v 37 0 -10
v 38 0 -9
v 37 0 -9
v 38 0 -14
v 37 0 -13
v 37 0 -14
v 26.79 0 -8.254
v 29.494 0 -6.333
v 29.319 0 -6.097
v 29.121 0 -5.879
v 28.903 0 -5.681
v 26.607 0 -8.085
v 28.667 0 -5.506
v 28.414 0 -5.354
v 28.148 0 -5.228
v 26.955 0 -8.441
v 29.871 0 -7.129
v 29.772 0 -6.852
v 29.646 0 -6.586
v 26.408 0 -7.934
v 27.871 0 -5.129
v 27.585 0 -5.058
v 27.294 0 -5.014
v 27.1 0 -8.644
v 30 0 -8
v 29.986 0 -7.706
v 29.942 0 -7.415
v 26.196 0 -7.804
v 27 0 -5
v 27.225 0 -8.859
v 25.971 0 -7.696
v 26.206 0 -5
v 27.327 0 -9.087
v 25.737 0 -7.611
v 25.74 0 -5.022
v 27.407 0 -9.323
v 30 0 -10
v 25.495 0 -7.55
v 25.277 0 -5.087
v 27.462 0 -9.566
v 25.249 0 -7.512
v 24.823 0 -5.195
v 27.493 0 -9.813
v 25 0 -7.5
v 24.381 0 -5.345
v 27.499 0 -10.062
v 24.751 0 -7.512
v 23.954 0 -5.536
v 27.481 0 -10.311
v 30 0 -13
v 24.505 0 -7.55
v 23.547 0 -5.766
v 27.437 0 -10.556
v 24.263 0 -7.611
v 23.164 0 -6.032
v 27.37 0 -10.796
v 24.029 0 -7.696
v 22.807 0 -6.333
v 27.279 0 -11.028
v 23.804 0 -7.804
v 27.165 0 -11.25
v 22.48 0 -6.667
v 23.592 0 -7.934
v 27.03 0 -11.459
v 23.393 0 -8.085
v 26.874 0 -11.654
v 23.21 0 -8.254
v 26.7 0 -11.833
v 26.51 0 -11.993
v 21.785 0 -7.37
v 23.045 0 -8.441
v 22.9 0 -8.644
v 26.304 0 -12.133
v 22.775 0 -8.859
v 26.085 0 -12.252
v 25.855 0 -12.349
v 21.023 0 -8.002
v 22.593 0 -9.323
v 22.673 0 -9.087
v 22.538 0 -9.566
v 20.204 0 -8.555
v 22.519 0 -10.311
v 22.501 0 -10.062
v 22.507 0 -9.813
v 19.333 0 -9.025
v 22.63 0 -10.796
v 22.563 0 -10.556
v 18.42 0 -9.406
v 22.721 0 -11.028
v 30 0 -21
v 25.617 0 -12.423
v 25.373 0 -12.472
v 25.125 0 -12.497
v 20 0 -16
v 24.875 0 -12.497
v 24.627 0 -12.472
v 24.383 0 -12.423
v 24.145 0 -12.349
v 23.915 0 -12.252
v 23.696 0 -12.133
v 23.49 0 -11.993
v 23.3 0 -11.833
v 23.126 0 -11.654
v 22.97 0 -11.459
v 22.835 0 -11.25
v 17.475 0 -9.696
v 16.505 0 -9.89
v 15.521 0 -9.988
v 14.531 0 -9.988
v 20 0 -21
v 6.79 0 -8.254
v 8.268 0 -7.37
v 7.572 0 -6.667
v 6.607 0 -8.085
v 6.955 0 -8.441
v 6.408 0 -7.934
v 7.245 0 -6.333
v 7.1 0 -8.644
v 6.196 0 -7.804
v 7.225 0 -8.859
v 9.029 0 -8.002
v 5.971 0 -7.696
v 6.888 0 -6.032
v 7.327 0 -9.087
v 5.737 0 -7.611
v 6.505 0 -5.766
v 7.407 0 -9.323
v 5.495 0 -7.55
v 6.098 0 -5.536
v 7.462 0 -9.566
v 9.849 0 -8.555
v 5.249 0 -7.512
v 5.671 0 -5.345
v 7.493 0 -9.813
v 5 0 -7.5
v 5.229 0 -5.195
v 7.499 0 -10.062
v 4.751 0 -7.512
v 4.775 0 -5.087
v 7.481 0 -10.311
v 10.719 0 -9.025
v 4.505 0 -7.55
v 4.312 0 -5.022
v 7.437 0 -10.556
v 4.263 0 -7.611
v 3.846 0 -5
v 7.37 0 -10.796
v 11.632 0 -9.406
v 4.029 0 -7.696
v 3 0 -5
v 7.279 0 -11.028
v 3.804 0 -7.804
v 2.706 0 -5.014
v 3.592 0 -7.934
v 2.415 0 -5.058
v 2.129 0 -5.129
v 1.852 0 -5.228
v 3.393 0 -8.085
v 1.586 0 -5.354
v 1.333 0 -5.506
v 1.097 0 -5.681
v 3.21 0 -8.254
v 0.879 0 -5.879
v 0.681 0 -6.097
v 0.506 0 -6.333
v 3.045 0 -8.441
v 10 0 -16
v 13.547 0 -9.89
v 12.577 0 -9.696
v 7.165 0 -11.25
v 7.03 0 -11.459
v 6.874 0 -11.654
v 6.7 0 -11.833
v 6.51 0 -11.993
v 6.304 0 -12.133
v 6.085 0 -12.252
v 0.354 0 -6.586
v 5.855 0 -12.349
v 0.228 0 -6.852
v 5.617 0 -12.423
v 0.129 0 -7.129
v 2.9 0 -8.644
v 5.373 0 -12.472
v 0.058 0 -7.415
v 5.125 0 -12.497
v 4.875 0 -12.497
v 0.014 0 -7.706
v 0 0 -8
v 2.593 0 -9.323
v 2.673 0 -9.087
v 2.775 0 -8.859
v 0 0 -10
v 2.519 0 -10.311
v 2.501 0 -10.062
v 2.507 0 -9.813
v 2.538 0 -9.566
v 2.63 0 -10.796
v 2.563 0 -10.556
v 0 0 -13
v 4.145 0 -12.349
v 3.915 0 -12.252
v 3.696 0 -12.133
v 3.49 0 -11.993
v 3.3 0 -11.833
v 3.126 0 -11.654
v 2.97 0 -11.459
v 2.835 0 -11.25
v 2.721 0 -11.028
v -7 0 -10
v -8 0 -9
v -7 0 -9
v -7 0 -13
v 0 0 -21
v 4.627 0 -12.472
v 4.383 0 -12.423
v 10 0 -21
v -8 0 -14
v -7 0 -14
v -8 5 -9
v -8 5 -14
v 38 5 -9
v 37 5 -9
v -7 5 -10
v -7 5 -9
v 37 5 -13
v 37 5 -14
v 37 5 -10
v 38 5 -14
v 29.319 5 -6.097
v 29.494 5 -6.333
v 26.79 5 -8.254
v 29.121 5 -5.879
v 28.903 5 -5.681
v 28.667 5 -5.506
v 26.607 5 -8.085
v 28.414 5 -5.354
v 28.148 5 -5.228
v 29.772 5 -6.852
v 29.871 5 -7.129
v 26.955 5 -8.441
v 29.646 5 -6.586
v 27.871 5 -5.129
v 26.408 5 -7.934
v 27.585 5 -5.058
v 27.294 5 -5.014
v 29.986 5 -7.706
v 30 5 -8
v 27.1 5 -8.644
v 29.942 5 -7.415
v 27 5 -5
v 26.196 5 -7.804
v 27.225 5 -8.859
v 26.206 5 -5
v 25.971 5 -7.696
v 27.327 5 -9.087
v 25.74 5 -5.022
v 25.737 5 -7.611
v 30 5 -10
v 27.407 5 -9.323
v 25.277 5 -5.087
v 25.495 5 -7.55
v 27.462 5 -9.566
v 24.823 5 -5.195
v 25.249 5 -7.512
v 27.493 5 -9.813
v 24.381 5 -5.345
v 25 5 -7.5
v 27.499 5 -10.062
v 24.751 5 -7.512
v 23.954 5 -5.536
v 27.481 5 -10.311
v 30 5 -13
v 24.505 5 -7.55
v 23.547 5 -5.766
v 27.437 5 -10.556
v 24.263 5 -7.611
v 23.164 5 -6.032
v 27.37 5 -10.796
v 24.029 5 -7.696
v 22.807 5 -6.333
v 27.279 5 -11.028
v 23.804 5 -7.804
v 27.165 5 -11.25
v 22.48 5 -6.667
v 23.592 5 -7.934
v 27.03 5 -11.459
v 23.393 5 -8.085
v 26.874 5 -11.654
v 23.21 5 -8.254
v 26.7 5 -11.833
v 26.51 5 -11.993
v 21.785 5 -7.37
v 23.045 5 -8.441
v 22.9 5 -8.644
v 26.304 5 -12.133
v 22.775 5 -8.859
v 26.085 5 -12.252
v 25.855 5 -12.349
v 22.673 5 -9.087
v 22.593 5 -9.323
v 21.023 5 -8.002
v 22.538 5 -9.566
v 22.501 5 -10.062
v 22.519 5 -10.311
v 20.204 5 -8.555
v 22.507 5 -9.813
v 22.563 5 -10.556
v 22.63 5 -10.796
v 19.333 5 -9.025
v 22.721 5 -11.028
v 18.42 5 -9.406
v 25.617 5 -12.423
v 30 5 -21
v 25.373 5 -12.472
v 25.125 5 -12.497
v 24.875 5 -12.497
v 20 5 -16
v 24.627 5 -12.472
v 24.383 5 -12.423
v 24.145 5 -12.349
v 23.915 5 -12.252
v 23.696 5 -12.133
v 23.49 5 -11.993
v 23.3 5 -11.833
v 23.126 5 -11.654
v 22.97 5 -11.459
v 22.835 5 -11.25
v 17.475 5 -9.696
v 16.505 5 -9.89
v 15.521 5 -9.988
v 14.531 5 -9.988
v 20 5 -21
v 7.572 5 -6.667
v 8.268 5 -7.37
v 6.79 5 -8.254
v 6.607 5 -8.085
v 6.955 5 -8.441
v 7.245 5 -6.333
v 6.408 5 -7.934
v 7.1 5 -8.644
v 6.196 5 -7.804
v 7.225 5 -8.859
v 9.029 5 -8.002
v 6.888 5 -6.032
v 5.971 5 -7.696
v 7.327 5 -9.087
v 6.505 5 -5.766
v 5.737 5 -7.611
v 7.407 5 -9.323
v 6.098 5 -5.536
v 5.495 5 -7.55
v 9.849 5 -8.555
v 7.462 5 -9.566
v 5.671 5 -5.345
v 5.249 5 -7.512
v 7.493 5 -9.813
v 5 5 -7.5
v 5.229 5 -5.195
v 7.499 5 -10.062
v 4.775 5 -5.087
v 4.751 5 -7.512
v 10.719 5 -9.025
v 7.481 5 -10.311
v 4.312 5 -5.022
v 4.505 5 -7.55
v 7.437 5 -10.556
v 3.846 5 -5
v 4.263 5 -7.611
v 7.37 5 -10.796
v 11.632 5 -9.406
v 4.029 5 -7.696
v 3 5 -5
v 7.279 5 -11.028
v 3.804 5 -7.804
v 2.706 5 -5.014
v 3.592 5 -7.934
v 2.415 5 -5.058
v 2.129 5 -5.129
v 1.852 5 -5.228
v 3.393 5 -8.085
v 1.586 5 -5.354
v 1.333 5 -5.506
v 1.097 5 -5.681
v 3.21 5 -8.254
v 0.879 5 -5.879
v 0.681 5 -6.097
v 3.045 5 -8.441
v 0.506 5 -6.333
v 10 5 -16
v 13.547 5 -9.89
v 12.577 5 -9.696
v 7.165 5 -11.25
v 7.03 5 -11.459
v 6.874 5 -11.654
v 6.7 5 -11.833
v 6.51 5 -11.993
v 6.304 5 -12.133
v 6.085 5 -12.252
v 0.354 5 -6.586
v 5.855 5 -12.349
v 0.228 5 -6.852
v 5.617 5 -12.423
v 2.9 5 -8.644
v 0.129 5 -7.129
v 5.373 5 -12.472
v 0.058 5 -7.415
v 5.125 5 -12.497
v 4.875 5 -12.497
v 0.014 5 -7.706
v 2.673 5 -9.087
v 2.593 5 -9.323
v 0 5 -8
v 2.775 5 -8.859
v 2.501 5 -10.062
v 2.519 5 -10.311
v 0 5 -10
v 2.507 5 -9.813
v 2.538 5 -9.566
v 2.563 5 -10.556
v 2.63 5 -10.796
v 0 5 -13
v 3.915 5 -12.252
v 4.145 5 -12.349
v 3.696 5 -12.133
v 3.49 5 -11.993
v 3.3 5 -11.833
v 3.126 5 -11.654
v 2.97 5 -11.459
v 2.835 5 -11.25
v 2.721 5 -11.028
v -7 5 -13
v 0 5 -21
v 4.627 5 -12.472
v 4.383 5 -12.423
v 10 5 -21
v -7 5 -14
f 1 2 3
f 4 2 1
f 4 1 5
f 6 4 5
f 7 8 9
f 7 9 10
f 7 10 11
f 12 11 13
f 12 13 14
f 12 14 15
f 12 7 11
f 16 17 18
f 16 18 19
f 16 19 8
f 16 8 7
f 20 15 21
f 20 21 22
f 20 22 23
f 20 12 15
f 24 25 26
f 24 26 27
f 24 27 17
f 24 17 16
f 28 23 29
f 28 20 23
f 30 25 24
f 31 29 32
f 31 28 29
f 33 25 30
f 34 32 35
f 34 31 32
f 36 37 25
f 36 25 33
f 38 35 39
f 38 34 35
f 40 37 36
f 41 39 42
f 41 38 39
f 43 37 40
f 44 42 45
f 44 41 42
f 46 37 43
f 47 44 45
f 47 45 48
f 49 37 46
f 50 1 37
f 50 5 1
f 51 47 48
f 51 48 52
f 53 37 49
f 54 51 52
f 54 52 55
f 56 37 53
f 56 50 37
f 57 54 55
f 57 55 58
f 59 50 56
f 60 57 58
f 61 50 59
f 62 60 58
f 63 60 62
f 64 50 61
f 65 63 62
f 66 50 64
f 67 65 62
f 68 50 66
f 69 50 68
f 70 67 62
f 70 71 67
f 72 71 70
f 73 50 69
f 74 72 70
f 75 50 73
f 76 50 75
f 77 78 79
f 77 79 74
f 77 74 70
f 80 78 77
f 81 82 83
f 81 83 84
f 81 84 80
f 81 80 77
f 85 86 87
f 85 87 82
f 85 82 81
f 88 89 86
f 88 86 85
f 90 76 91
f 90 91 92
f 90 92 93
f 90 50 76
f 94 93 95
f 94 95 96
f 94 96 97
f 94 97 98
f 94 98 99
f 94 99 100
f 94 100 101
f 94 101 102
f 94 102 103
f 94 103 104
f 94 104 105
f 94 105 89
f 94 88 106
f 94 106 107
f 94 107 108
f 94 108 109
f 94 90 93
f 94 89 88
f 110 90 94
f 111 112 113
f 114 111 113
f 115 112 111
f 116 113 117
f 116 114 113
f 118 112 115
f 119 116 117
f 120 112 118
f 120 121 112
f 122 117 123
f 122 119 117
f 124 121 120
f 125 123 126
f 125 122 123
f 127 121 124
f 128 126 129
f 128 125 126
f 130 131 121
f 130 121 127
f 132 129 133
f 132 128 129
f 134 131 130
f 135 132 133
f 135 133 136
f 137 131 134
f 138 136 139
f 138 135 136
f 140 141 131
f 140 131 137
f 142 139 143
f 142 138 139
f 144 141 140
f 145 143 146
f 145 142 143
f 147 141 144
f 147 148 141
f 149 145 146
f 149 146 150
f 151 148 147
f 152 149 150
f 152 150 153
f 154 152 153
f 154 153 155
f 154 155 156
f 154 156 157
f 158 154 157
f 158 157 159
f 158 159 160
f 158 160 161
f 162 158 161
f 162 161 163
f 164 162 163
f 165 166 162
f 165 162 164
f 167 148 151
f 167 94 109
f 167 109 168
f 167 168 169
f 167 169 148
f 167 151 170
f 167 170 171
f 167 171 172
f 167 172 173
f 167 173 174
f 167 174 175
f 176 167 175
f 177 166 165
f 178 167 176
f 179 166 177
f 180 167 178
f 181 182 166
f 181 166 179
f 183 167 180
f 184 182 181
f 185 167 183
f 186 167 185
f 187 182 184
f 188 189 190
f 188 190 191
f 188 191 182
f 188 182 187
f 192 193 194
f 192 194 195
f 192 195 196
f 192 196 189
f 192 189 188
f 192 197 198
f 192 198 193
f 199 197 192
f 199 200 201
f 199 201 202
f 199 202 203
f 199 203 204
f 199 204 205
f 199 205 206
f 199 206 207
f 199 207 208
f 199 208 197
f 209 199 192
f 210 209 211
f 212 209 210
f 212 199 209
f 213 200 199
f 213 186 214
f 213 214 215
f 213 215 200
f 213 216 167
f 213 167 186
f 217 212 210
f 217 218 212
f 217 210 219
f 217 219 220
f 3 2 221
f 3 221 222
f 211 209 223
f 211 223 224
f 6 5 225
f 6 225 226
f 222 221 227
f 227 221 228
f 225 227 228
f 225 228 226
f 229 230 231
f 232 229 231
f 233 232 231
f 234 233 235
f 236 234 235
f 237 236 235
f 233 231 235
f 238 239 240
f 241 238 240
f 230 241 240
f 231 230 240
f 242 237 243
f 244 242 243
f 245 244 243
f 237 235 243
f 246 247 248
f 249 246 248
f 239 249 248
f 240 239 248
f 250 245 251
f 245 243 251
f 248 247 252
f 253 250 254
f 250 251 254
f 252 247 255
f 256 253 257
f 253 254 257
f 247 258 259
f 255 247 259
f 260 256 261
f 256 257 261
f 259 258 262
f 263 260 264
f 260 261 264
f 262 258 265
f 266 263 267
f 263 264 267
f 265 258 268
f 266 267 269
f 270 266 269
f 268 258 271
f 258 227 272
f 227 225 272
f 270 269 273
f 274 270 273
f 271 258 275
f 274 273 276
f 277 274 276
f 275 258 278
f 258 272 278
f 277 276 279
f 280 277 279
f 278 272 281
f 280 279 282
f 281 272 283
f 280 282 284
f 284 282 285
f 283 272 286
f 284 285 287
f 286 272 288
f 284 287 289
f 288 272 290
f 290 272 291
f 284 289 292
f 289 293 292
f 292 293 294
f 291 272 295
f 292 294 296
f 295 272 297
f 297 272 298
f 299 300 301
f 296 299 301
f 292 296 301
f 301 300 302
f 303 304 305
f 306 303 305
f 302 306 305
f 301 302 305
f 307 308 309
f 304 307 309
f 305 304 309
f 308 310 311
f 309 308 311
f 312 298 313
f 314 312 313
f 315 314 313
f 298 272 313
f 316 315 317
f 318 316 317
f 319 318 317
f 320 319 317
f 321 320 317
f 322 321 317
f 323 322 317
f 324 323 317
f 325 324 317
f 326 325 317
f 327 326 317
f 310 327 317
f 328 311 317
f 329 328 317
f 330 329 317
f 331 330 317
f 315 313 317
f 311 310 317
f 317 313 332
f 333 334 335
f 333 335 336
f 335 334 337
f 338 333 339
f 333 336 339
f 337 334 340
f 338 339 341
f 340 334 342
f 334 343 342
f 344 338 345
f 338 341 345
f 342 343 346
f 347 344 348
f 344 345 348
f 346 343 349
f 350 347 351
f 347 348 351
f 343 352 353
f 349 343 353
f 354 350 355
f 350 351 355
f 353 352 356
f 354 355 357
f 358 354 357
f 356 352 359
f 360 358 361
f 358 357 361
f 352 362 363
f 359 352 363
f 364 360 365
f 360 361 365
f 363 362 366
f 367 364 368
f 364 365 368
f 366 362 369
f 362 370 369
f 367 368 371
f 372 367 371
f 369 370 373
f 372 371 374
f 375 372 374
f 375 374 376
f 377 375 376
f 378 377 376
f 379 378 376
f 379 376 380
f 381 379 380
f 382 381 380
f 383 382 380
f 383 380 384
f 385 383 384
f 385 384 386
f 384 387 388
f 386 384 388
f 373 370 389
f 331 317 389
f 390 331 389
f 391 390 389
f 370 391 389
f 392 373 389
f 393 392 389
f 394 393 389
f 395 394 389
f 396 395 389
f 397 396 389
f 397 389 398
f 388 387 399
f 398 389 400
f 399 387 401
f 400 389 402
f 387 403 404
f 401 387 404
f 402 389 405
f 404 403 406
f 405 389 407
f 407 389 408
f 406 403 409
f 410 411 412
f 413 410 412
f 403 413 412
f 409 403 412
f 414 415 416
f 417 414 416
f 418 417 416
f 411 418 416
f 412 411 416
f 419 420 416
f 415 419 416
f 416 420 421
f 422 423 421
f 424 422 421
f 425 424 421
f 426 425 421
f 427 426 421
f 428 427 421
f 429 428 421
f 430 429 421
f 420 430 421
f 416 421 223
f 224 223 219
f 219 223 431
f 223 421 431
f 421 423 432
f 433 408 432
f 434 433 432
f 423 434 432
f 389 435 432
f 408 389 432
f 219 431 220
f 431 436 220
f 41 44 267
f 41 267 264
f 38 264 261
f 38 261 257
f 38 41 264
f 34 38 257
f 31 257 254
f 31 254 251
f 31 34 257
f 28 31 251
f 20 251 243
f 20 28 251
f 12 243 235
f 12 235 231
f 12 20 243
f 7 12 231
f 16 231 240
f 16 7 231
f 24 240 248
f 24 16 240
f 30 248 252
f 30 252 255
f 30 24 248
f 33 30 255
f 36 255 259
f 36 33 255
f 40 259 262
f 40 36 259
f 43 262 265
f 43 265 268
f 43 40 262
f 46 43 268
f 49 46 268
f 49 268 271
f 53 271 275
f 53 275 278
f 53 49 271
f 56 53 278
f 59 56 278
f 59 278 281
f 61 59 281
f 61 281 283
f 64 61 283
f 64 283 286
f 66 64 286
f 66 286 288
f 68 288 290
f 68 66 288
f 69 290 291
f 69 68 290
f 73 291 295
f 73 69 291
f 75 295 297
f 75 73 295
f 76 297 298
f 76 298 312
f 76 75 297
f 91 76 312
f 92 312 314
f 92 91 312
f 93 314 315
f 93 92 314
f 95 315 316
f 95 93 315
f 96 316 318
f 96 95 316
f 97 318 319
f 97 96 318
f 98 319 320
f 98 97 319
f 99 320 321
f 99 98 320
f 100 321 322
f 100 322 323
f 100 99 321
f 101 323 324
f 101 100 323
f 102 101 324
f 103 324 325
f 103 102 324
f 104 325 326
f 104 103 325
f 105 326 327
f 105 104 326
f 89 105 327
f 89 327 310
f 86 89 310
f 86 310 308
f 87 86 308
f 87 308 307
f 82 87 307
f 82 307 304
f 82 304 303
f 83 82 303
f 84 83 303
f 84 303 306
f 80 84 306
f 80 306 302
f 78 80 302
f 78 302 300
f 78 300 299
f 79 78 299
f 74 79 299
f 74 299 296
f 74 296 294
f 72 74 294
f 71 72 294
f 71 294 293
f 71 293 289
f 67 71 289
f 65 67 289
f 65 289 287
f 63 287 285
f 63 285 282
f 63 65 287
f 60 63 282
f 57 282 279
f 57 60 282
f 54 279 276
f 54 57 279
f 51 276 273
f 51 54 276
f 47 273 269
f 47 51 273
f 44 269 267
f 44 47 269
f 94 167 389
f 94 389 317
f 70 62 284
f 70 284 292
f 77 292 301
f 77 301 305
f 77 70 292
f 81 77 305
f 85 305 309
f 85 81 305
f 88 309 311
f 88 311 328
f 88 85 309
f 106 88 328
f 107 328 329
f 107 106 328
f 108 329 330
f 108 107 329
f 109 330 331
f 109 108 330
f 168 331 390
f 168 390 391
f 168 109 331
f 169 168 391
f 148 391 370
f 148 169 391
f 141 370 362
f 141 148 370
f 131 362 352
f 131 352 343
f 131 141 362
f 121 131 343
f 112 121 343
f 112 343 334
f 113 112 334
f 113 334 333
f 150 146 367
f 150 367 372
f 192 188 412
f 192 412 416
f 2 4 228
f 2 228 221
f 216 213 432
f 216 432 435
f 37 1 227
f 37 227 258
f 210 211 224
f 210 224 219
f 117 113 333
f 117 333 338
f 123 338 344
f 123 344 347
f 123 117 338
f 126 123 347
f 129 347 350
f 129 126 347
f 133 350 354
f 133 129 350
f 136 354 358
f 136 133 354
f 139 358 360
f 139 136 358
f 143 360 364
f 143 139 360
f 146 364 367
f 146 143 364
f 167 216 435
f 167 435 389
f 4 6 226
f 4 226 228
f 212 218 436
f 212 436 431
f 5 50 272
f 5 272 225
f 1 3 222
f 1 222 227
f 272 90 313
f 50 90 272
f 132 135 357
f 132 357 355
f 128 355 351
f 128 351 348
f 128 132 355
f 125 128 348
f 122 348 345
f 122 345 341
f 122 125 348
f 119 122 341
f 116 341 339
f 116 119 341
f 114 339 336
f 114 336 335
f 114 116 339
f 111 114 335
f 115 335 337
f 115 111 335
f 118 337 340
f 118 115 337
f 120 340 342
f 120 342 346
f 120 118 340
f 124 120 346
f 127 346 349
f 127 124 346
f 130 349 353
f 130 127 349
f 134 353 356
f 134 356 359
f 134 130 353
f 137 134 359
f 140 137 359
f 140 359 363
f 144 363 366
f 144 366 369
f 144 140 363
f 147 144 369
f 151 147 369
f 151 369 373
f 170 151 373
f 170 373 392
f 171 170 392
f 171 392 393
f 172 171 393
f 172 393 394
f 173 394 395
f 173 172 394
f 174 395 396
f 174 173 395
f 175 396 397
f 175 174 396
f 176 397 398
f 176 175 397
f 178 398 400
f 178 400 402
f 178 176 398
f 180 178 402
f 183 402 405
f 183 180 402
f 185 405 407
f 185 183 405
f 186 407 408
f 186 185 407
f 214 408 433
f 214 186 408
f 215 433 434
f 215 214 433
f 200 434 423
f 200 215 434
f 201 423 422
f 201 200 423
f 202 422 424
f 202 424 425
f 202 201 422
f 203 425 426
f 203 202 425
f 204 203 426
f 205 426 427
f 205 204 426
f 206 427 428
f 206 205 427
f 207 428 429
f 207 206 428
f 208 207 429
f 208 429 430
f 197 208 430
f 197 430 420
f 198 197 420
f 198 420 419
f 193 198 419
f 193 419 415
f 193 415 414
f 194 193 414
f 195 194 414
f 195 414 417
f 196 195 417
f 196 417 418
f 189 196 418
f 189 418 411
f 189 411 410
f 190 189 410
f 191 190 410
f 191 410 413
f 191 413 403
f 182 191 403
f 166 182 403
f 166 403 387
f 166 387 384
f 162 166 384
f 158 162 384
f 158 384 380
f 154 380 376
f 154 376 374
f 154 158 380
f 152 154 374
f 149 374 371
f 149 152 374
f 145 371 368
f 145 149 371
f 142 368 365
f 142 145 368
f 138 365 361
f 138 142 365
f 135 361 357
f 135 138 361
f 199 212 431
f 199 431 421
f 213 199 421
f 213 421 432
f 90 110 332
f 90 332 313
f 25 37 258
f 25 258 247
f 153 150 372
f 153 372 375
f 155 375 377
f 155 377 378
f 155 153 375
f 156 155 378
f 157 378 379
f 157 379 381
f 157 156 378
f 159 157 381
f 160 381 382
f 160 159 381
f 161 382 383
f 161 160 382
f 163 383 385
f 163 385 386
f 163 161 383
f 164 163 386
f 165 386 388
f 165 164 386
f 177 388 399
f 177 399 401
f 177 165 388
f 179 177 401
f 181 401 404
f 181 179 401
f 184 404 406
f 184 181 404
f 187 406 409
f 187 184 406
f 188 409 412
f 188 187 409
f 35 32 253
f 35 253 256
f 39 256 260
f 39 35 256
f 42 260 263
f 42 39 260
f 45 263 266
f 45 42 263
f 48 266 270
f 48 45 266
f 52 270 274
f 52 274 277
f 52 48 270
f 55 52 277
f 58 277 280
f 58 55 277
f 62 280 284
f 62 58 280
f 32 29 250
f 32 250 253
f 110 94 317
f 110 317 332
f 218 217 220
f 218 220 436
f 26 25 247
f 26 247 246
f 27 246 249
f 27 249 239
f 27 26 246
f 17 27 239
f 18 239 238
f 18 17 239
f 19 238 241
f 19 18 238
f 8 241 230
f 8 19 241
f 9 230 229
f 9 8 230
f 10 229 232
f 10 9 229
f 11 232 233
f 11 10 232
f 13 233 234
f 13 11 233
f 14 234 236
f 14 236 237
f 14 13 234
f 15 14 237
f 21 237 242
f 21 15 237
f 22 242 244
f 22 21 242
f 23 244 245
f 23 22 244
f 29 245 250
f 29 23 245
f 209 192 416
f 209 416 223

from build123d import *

# Parameters (mm, degrees)
SKETCH_1_R      = 2.5
EXTRUDE_1_DEPTH = 5


with BuildPart() as part:
    # 草图1 → 凸台-拉伸1 (new body)
    with BuildSketch(Plane(origin=(0, 0, 0), x_dir=(1, 0, 0), z_dir=(0, 1, 0))):
        with BuildLine():
            Line((20, 21), (30, 21))
            Line((30, 21), (30, 13))
            Line((30, 13), (37, 13))
            Line((37, 13), (37, 14))
            Line((37, 14), (38, 14))
            Line((38, 14), (38, 9))
            Line((38, 9), (37, 9))
            Line((37, 9), (37, 10))
            Line((37, 10), (30, 10))
            Line((30, 10), (30, 8))
            ThreePointArc((30, 8), (29.121320344, 5.878679656), (27, 5))
            Line((27, 5), (26.206359593, 5))
            ThreePointArc((26.206359593, 5), (24.165118141, 5.435645354), (22.47957963, 6.666666667))
            ThreePointArc((22.47957963, 6.666666667), (15.026019705, 10), (7.57245978, 6.666666667))
            ThreePointArc((7.57245978, 6.666666667), (5.88692127, 5.435645354), (3.845679818, 5))
            Line((3.845679818, 5), (3, 5))
            ThreePointArc((3, 5), (0.878679656, 5.878679656), (0, 8))
            Line((0, 8), (0, 10))
            Line((0, 10), (-7, 10))
            Line((-7, 10), (-7, 9))
            Line((-7, 9), (-8, 9))
            Line((-8, 9), (-8, 14))
            Line((-8, 14), (-7, 14))
            Line((-7, 14), (-7, 13))
            Line((-7, 13), (0, 13))
            Line((0, 13), (0, 21))
            Line((0, 21), (10, 21))
            Line((10, 21), (10, 16))
            Line((10, 16), (20, 16))
            Line((20, 16), (20, 21))
        make_face()
        with Locations(Location((5, 10, 0), (0, 0, 270))):
            Circle(SKETCH_1_R, mode=Mode.SUBTRACT)
        with Locations(Location((25, 10, 0), (0, 0, 270))):
            Circle(SKETCH_1_R, mode=Mode.SUBTRACT)
    extrude(amount=EXTRUDE_1_DEPTH)


solid = part.part
